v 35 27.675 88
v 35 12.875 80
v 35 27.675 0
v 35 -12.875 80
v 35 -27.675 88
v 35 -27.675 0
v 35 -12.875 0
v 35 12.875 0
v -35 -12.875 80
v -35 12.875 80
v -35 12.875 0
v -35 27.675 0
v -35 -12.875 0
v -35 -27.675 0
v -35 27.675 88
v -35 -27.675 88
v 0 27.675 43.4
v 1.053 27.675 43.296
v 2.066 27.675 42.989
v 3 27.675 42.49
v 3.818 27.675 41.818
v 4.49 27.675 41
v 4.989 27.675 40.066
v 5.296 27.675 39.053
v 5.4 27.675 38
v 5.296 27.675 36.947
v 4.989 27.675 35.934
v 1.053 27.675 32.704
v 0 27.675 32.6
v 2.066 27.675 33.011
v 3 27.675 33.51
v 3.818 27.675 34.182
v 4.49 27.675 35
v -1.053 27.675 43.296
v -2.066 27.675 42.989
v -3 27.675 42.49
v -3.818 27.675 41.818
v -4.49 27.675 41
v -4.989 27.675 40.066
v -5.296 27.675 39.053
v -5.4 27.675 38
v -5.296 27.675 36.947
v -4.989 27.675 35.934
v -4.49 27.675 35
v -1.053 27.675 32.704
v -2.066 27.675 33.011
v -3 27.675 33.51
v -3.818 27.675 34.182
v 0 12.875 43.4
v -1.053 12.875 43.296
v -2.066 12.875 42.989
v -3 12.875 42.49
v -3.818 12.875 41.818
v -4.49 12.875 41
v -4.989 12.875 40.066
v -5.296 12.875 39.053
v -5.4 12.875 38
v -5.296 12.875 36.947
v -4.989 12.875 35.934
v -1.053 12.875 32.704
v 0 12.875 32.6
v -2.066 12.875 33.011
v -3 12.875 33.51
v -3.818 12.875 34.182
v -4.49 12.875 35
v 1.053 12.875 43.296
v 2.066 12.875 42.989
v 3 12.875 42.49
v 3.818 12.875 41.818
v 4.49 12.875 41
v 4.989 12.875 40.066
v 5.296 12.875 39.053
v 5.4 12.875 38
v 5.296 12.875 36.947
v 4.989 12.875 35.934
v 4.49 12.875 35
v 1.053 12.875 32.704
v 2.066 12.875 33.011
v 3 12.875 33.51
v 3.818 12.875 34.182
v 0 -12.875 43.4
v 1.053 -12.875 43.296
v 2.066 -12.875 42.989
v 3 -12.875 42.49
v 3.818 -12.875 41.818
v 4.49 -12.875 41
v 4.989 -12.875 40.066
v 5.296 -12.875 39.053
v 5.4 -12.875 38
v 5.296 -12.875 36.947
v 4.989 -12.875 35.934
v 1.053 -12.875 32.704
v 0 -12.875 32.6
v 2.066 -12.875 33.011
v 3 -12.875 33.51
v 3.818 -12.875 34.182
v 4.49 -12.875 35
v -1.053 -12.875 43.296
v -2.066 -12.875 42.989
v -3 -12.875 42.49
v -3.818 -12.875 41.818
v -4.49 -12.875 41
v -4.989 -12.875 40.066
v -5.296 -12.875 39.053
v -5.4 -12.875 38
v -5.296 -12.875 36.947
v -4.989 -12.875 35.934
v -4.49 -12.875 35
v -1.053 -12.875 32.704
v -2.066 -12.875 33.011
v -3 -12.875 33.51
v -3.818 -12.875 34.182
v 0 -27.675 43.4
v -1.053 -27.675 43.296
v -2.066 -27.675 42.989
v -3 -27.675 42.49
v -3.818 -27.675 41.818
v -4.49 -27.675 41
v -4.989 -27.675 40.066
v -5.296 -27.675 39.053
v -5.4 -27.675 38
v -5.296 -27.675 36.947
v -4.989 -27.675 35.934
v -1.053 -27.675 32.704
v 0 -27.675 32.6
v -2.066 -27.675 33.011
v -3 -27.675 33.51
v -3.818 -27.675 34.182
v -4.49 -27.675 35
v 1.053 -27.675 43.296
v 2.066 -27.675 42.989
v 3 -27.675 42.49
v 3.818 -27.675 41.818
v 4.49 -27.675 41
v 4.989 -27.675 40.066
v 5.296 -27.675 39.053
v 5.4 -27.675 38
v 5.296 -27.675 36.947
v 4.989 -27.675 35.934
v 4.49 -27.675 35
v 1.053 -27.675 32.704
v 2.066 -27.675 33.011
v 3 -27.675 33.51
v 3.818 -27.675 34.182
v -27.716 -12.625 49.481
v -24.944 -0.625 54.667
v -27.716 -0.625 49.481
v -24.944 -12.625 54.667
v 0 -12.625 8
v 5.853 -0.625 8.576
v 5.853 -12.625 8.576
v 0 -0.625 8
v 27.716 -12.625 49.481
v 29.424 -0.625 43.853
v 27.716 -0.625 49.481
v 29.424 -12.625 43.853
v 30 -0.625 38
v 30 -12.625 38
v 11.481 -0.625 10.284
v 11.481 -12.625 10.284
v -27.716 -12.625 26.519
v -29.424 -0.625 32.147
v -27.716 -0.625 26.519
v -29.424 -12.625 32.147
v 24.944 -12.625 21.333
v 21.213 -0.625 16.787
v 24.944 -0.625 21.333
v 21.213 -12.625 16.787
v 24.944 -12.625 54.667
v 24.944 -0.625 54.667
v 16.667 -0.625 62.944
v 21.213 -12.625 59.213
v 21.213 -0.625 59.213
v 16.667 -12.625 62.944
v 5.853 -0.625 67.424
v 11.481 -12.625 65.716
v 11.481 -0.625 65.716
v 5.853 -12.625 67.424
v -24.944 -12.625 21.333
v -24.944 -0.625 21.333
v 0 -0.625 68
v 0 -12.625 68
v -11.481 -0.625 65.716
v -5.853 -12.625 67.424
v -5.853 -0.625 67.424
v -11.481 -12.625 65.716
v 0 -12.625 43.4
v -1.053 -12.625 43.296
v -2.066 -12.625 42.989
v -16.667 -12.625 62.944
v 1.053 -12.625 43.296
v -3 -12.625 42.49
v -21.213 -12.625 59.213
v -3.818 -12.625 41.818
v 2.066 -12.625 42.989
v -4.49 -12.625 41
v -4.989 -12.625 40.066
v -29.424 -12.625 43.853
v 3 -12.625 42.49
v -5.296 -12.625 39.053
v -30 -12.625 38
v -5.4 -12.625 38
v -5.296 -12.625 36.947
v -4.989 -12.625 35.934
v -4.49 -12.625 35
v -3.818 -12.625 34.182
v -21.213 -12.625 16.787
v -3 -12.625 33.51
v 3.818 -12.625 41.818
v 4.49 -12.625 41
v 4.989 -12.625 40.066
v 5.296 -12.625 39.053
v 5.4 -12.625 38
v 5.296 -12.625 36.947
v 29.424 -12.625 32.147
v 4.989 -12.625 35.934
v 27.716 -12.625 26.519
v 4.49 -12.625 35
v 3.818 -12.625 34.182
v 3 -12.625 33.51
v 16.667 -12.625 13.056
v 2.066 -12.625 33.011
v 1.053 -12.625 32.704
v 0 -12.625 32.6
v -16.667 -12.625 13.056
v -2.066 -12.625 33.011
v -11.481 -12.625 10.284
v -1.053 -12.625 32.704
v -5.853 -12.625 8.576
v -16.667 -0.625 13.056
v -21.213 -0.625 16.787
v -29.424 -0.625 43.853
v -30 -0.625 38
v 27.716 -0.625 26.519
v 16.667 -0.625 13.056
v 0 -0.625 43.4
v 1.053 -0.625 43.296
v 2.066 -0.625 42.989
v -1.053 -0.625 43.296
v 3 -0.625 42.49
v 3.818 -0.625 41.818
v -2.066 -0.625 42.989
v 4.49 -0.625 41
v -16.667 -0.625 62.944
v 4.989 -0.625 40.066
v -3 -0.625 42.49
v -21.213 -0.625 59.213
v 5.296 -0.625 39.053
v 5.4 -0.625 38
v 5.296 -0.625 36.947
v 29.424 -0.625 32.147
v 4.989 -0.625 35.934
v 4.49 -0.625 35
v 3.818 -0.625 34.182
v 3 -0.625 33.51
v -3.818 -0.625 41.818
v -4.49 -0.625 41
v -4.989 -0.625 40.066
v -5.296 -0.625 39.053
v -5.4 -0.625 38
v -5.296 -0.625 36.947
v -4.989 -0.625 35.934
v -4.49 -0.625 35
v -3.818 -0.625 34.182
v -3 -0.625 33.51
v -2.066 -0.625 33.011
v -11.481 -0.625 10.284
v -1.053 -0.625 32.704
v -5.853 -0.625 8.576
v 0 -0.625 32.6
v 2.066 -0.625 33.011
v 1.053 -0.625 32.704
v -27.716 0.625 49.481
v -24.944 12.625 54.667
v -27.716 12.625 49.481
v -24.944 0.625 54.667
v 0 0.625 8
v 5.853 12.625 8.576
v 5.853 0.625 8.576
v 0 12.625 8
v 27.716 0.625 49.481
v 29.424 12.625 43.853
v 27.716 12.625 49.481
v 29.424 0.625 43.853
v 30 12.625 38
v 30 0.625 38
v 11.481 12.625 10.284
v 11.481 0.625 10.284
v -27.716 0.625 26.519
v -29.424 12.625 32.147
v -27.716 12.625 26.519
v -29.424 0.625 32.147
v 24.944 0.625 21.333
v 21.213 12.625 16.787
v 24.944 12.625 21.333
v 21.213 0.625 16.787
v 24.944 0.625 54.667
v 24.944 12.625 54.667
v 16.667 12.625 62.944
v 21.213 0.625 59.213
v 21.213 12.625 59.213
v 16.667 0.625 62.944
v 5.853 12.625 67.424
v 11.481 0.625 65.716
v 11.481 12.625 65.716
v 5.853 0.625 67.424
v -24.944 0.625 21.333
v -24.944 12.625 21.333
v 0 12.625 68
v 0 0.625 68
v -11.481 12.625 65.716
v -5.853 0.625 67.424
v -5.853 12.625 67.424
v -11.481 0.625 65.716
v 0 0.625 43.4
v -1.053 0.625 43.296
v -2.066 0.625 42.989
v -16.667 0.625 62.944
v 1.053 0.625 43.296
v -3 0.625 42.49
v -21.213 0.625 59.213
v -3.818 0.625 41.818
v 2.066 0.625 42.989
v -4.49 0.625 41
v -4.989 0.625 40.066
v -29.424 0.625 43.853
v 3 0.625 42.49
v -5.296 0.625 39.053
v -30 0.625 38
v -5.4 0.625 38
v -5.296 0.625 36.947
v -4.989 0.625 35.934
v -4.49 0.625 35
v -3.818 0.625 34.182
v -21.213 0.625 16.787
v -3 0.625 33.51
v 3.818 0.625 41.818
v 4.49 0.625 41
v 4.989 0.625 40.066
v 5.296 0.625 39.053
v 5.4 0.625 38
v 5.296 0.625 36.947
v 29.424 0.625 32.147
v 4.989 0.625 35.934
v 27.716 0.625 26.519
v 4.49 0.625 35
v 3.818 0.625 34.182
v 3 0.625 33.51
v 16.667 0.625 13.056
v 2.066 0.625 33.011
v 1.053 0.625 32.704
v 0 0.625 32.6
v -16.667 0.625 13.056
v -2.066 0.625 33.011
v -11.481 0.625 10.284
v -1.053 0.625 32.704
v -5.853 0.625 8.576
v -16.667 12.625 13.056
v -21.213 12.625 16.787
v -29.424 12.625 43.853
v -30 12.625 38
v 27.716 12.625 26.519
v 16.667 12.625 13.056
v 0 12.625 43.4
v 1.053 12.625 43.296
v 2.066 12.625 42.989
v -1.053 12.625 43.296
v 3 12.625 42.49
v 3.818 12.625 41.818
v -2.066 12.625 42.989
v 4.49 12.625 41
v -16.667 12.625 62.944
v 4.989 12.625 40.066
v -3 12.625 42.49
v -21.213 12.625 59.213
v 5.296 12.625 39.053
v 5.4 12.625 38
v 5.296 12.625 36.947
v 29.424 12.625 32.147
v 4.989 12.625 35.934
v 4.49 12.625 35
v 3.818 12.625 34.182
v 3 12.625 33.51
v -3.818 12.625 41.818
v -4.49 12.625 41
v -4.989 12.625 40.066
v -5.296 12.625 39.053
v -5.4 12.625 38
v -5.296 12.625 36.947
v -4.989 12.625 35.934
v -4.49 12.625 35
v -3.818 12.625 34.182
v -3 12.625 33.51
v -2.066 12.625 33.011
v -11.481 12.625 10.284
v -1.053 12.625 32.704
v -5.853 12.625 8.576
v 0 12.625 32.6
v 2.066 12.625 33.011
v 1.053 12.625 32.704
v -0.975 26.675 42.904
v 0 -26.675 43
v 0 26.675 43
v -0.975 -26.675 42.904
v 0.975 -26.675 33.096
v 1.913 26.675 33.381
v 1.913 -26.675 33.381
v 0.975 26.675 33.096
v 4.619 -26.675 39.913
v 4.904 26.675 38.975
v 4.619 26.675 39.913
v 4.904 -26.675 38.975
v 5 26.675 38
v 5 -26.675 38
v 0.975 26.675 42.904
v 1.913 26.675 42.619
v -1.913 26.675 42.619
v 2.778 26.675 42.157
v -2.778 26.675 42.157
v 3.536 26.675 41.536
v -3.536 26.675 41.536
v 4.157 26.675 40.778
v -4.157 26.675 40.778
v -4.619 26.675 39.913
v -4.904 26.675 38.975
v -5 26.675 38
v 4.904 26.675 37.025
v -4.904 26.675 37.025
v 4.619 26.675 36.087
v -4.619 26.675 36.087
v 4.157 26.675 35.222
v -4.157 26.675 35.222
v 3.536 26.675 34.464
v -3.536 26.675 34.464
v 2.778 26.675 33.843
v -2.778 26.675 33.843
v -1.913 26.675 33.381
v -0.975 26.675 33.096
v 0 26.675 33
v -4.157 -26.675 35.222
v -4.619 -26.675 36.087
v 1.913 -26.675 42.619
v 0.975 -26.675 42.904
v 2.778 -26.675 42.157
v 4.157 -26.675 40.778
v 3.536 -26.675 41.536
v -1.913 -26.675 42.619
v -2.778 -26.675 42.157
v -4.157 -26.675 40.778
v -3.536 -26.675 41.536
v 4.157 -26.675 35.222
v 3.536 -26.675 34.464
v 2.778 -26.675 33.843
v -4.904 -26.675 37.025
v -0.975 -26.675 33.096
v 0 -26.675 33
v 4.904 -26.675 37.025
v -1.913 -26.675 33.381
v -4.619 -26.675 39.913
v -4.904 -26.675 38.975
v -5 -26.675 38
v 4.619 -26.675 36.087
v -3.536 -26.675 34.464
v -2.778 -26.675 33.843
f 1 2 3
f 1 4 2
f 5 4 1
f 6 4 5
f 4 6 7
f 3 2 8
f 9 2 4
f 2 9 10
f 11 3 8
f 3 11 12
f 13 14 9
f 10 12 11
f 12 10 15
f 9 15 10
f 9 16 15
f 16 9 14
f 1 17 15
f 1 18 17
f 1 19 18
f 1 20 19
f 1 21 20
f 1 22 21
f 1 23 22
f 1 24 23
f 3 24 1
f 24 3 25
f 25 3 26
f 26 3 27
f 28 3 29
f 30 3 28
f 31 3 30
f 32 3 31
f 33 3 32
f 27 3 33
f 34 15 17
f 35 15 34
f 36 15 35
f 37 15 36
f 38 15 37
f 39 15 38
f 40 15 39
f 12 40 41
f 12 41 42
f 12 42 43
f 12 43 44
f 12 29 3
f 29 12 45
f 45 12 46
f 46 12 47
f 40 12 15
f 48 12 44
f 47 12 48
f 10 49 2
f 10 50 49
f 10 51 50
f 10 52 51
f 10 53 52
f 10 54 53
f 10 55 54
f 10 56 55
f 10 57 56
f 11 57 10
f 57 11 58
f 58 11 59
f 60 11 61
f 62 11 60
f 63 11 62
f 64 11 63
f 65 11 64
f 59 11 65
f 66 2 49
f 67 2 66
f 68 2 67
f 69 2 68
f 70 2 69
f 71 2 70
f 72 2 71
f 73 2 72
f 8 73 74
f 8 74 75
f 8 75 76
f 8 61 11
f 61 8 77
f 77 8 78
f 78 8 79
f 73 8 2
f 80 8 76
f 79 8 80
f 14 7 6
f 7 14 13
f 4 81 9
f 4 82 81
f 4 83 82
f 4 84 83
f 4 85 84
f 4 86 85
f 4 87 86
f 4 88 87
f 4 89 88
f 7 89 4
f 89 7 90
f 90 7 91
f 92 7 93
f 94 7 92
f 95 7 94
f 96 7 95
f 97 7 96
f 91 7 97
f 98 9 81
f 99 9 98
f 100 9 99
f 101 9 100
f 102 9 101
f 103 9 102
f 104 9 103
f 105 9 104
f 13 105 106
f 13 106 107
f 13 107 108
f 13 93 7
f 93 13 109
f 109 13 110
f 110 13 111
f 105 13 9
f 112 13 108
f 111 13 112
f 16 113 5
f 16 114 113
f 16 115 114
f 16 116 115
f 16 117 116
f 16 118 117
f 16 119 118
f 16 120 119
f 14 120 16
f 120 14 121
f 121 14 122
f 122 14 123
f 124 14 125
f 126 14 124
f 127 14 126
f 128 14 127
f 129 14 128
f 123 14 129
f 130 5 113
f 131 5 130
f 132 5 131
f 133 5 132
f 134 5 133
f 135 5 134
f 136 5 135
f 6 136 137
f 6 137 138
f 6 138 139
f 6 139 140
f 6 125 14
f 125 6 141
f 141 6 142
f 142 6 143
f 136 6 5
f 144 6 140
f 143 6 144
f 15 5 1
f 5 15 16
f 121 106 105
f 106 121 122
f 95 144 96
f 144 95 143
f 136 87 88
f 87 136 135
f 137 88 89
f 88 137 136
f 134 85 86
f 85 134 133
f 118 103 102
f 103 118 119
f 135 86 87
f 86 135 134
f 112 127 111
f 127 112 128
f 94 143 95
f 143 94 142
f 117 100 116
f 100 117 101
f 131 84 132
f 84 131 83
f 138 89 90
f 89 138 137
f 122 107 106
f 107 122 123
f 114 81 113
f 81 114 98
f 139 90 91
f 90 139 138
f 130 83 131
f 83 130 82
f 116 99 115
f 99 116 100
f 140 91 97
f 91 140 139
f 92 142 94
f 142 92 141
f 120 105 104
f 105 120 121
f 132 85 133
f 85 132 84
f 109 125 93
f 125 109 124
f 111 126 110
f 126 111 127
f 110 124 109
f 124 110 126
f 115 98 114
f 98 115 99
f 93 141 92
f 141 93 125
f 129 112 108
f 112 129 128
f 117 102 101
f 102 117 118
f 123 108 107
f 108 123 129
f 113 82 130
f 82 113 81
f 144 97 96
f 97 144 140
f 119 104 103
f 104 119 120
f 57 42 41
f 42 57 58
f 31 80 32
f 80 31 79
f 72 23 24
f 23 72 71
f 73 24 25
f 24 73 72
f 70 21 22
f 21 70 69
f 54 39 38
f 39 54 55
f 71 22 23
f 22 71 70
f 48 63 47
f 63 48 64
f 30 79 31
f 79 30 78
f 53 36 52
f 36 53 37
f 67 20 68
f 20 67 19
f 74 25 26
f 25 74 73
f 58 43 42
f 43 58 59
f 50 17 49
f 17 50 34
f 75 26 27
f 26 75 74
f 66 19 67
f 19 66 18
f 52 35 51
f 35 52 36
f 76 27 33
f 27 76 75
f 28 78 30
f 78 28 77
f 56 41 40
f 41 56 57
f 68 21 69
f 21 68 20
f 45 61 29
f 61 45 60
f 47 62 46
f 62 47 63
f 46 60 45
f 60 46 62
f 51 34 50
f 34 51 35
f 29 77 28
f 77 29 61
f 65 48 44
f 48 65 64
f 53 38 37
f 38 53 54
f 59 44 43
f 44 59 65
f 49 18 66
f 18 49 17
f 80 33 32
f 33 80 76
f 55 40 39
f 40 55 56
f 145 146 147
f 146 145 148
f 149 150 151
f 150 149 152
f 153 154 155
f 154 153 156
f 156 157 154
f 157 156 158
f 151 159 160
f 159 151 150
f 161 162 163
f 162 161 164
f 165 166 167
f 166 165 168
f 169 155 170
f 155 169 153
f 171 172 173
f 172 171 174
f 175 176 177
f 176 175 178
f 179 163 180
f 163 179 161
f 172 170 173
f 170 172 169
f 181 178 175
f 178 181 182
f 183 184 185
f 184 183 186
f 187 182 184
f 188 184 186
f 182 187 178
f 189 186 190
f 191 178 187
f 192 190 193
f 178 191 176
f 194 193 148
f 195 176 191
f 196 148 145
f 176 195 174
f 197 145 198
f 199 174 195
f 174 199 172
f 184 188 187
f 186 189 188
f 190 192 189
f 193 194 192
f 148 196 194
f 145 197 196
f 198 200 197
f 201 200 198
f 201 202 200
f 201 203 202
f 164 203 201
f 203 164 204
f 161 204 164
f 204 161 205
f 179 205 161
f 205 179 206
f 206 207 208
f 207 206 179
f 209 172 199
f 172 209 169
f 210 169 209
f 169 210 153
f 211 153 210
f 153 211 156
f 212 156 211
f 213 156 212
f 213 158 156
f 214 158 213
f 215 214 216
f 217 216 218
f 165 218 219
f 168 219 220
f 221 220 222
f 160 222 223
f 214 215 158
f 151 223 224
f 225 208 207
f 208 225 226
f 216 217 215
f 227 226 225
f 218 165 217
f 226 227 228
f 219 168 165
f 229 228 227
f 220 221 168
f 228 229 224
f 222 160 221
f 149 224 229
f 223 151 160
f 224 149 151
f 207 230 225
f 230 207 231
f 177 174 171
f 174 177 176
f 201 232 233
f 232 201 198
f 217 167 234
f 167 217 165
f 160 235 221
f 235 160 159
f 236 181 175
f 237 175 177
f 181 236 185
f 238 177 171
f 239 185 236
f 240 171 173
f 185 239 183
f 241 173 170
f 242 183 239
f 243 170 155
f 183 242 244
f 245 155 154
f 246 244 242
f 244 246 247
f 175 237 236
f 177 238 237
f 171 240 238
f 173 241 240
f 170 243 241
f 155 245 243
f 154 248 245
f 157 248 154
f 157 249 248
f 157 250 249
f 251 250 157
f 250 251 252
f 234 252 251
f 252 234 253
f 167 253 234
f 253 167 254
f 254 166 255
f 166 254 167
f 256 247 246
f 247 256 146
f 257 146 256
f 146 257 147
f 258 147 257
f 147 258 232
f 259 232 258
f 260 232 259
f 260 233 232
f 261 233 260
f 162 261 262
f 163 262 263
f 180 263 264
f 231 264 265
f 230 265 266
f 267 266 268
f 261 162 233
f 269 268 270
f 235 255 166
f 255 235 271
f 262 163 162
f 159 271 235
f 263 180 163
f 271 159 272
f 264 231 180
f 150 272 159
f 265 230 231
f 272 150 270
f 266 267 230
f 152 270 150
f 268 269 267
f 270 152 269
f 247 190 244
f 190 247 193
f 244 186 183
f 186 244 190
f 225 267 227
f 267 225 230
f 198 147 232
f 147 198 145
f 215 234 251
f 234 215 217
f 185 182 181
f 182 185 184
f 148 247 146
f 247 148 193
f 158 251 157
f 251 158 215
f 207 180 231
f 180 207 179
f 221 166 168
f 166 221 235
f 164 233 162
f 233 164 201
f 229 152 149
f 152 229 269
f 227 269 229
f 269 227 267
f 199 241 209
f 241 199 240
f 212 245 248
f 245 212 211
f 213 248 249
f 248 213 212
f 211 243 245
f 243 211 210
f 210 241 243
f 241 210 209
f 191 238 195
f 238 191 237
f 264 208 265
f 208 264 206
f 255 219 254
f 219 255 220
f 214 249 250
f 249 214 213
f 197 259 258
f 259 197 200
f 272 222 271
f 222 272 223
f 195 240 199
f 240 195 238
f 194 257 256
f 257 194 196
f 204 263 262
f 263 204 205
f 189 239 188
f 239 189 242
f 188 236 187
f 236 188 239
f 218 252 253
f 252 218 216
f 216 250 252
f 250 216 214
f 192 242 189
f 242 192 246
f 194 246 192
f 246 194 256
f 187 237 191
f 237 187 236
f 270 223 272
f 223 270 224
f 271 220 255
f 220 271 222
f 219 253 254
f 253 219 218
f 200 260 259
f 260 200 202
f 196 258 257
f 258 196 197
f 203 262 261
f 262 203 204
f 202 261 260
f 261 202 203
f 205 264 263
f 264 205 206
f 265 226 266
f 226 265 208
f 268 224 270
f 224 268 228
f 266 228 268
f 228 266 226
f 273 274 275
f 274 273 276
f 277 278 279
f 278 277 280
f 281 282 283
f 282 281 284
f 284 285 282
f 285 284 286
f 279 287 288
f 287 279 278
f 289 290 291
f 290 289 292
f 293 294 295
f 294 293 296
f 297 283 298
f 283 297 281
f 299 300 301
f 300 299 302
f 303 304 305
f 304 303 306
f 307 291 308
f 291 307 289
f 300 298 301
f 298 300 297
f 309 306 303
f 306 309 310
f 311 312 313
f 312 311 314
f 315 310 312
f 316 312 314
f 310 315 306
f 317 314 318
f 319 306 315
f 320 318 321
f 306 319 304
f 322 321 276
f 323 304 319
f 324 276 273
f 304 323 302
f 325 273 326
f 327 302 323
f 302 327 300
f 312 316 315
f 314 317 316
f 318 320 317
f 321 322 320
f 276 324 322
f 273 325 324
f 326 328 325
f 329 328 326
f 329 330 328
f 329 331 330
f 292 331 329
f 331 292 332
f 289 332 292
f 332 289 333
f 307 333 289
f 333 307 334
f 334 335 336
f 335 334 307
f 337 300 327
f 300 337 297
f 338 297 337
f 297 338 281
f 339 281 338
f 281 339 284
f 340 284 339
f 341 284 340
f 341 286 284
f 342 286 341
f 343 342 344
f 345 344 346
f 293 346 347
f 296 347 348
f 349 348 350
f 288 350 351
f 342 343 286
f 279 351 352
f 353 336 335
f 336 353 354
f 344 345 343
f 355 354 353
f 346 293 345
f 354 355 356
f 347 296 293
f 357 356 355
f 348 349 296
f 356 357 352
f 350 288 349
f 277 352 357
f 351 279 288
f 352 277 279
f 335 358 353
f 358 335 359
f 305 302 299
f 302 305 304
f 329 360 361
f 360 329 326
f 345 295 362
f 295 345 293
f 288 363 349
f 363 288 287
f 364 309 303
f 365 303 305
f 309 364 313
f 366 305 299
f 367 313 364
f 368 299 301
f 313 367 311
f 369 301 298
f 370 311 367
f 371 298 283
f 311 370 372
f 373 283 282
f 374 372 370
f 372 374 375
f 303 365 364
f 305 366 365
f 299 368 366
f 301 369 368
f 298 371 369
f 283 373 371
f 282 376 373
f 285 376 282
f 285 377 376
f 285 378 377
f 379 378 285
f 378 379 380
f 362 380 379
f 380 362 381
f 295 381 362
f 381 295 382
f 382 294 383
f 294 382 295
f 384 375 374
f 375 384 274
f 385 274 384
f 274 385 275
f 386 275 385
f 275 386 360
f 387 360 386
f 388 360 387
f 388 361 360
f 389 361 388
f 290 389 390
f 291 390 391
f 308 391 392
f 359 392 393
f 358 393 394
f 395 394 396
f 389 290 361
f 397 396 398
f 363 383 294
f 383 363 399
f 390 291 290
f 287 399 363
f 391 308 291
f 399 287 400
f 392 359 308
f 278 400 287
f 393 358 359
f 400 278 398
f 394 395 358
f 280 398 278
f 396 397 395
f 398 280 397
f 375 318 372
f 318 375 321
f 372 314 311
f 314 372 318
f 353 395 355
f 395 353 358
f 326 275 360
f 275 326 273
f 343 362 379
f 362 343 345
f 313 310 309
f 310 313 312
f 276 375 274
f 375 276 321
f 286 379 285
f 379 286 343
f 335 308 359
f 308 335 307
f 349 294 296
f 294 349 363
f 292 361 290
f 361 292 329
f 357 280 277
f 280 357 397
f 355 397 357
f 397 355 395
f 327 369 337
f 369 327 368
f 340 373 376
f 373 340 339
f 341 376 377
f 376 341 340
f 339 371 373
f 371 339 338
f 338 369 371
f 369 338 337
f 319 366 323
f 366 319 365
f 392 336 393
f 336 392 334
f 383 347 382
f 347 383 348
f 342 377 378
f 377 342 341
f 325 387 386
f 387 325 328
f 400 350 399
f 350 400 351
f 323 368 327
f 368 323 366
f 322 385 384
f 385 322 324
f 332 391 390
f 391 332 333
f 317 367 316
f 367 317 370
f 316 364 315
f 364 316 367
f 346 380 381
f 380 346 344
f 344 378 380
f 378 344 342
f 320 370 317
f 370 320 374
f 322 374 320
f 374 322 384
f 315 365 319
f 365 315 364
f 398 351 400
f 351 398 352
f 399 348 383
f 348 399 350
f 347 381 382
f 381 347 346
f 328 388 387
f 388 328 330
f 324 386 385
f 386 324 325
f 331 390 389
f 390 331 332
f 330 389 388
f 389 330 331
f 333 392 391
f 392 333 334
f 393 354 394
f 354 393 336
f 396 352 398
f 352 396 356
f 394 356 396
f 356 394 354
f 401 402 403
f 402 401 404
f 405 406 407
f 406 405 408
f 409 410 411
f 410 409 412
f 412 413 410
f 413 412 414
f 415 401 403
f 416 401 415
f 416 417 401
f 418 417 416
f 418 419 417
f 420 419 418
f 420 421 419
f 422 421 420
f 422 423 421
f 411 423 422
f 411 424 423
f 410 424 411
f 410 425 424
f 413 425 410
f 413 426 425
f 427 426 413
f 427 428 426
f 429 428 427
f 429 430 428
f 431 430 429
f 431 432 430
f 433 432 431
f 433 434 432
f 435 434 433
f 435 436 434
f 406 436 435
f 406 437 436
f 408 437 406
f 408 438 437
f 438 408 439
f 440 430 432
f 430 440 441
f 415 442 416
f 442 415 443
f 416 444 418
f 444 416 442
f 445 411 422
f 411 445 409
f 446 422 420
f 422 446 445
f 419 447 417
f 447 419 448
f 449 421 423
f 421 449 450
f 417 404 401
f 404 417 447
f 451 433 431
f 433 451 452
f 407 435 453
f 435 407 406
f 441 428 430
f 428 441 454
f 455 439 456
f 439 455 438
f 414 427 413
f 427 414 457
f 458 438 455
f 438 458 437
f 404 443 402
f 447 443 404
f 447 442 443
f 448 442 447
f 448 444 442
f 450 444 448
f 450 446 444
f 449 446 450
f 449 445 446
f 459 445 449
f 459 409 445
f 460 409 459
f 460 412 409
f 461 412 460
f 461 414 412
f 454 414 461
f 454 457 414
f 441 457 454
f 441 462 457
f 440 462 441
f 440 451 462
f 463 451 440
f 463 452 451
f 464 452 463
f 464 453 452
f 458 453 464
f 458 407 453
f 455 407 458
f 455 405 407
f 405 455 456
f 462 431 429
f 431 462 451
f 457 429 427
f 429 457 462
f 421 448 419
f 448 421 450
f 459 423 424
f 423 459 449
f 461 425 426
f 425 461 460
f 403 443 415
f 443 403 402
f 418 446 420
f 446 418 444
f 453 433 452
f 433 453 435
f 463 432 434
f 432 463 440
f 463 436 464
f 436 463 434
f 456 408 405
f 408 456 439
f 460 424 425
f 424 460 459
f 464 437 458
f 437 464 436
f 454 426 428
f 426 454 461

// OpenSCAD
$fn = 32;

// ------------------------------------------------------------------------
// Trolley wheel set: wheels d60, fork 80 mm tall
// Every part is its own module, assembly() places every instance.
// ------------------------------------------------------------------------

// --- part 1 ---
module trolley_fork() {
  difference() {
    union() {
      translate([-35, 12.875, 0]) cube([70, 14.8, 80]);
      translate([-35, -27.675, 0]) cube([70, 14.8, 80]);
      translate([-35, -27.675, 80]) cube([70, 55.35, 8]);
    }
    translate([0, -20.275, 38]) rotate([90, 0, 0]) cylinder(h = 16.8, d = 10.8, center = true);
    translate([0, 20.275, 38]) rotate([90, 0, 0]) cylinder(h = 16.8, d = 10.8, center = true);
  }
}

// --- part 2 ---
module trolley_wheel() {
  difference() {
      translate([0, 0, 0]) cylinder(h = 12, d = 60);
      translate([0, 0, -1]) cylinder(h = 14, d = 10.8);
    }
}

// --- part 3 ---
module trolley_axle() {
  translate([0, 0, -26.675]) cylinder(h = 53.35, d = 10);
}

// --- assembly ---
module assembly() {
  color([0.80, 0.24, 0.20]) translate([0, 0, 0]) rotate([0, 0, 0]) trolley_fork();
  color([0.20, 0.45, 0.75]) translate([0, -0.625, 38]) rotate([90, 0, 0]) trolley_wheel();
  color([0.25, 0.62, 0.32]) translate([0, 12.625, 38]) rotate([90, 0, 0]) trolley_wheel();
  color([0.92, 0.70, 0.18]) translate([0, 0, 38]) rotate([90, 0, 0]) trolley_axle();
}

assembly();
